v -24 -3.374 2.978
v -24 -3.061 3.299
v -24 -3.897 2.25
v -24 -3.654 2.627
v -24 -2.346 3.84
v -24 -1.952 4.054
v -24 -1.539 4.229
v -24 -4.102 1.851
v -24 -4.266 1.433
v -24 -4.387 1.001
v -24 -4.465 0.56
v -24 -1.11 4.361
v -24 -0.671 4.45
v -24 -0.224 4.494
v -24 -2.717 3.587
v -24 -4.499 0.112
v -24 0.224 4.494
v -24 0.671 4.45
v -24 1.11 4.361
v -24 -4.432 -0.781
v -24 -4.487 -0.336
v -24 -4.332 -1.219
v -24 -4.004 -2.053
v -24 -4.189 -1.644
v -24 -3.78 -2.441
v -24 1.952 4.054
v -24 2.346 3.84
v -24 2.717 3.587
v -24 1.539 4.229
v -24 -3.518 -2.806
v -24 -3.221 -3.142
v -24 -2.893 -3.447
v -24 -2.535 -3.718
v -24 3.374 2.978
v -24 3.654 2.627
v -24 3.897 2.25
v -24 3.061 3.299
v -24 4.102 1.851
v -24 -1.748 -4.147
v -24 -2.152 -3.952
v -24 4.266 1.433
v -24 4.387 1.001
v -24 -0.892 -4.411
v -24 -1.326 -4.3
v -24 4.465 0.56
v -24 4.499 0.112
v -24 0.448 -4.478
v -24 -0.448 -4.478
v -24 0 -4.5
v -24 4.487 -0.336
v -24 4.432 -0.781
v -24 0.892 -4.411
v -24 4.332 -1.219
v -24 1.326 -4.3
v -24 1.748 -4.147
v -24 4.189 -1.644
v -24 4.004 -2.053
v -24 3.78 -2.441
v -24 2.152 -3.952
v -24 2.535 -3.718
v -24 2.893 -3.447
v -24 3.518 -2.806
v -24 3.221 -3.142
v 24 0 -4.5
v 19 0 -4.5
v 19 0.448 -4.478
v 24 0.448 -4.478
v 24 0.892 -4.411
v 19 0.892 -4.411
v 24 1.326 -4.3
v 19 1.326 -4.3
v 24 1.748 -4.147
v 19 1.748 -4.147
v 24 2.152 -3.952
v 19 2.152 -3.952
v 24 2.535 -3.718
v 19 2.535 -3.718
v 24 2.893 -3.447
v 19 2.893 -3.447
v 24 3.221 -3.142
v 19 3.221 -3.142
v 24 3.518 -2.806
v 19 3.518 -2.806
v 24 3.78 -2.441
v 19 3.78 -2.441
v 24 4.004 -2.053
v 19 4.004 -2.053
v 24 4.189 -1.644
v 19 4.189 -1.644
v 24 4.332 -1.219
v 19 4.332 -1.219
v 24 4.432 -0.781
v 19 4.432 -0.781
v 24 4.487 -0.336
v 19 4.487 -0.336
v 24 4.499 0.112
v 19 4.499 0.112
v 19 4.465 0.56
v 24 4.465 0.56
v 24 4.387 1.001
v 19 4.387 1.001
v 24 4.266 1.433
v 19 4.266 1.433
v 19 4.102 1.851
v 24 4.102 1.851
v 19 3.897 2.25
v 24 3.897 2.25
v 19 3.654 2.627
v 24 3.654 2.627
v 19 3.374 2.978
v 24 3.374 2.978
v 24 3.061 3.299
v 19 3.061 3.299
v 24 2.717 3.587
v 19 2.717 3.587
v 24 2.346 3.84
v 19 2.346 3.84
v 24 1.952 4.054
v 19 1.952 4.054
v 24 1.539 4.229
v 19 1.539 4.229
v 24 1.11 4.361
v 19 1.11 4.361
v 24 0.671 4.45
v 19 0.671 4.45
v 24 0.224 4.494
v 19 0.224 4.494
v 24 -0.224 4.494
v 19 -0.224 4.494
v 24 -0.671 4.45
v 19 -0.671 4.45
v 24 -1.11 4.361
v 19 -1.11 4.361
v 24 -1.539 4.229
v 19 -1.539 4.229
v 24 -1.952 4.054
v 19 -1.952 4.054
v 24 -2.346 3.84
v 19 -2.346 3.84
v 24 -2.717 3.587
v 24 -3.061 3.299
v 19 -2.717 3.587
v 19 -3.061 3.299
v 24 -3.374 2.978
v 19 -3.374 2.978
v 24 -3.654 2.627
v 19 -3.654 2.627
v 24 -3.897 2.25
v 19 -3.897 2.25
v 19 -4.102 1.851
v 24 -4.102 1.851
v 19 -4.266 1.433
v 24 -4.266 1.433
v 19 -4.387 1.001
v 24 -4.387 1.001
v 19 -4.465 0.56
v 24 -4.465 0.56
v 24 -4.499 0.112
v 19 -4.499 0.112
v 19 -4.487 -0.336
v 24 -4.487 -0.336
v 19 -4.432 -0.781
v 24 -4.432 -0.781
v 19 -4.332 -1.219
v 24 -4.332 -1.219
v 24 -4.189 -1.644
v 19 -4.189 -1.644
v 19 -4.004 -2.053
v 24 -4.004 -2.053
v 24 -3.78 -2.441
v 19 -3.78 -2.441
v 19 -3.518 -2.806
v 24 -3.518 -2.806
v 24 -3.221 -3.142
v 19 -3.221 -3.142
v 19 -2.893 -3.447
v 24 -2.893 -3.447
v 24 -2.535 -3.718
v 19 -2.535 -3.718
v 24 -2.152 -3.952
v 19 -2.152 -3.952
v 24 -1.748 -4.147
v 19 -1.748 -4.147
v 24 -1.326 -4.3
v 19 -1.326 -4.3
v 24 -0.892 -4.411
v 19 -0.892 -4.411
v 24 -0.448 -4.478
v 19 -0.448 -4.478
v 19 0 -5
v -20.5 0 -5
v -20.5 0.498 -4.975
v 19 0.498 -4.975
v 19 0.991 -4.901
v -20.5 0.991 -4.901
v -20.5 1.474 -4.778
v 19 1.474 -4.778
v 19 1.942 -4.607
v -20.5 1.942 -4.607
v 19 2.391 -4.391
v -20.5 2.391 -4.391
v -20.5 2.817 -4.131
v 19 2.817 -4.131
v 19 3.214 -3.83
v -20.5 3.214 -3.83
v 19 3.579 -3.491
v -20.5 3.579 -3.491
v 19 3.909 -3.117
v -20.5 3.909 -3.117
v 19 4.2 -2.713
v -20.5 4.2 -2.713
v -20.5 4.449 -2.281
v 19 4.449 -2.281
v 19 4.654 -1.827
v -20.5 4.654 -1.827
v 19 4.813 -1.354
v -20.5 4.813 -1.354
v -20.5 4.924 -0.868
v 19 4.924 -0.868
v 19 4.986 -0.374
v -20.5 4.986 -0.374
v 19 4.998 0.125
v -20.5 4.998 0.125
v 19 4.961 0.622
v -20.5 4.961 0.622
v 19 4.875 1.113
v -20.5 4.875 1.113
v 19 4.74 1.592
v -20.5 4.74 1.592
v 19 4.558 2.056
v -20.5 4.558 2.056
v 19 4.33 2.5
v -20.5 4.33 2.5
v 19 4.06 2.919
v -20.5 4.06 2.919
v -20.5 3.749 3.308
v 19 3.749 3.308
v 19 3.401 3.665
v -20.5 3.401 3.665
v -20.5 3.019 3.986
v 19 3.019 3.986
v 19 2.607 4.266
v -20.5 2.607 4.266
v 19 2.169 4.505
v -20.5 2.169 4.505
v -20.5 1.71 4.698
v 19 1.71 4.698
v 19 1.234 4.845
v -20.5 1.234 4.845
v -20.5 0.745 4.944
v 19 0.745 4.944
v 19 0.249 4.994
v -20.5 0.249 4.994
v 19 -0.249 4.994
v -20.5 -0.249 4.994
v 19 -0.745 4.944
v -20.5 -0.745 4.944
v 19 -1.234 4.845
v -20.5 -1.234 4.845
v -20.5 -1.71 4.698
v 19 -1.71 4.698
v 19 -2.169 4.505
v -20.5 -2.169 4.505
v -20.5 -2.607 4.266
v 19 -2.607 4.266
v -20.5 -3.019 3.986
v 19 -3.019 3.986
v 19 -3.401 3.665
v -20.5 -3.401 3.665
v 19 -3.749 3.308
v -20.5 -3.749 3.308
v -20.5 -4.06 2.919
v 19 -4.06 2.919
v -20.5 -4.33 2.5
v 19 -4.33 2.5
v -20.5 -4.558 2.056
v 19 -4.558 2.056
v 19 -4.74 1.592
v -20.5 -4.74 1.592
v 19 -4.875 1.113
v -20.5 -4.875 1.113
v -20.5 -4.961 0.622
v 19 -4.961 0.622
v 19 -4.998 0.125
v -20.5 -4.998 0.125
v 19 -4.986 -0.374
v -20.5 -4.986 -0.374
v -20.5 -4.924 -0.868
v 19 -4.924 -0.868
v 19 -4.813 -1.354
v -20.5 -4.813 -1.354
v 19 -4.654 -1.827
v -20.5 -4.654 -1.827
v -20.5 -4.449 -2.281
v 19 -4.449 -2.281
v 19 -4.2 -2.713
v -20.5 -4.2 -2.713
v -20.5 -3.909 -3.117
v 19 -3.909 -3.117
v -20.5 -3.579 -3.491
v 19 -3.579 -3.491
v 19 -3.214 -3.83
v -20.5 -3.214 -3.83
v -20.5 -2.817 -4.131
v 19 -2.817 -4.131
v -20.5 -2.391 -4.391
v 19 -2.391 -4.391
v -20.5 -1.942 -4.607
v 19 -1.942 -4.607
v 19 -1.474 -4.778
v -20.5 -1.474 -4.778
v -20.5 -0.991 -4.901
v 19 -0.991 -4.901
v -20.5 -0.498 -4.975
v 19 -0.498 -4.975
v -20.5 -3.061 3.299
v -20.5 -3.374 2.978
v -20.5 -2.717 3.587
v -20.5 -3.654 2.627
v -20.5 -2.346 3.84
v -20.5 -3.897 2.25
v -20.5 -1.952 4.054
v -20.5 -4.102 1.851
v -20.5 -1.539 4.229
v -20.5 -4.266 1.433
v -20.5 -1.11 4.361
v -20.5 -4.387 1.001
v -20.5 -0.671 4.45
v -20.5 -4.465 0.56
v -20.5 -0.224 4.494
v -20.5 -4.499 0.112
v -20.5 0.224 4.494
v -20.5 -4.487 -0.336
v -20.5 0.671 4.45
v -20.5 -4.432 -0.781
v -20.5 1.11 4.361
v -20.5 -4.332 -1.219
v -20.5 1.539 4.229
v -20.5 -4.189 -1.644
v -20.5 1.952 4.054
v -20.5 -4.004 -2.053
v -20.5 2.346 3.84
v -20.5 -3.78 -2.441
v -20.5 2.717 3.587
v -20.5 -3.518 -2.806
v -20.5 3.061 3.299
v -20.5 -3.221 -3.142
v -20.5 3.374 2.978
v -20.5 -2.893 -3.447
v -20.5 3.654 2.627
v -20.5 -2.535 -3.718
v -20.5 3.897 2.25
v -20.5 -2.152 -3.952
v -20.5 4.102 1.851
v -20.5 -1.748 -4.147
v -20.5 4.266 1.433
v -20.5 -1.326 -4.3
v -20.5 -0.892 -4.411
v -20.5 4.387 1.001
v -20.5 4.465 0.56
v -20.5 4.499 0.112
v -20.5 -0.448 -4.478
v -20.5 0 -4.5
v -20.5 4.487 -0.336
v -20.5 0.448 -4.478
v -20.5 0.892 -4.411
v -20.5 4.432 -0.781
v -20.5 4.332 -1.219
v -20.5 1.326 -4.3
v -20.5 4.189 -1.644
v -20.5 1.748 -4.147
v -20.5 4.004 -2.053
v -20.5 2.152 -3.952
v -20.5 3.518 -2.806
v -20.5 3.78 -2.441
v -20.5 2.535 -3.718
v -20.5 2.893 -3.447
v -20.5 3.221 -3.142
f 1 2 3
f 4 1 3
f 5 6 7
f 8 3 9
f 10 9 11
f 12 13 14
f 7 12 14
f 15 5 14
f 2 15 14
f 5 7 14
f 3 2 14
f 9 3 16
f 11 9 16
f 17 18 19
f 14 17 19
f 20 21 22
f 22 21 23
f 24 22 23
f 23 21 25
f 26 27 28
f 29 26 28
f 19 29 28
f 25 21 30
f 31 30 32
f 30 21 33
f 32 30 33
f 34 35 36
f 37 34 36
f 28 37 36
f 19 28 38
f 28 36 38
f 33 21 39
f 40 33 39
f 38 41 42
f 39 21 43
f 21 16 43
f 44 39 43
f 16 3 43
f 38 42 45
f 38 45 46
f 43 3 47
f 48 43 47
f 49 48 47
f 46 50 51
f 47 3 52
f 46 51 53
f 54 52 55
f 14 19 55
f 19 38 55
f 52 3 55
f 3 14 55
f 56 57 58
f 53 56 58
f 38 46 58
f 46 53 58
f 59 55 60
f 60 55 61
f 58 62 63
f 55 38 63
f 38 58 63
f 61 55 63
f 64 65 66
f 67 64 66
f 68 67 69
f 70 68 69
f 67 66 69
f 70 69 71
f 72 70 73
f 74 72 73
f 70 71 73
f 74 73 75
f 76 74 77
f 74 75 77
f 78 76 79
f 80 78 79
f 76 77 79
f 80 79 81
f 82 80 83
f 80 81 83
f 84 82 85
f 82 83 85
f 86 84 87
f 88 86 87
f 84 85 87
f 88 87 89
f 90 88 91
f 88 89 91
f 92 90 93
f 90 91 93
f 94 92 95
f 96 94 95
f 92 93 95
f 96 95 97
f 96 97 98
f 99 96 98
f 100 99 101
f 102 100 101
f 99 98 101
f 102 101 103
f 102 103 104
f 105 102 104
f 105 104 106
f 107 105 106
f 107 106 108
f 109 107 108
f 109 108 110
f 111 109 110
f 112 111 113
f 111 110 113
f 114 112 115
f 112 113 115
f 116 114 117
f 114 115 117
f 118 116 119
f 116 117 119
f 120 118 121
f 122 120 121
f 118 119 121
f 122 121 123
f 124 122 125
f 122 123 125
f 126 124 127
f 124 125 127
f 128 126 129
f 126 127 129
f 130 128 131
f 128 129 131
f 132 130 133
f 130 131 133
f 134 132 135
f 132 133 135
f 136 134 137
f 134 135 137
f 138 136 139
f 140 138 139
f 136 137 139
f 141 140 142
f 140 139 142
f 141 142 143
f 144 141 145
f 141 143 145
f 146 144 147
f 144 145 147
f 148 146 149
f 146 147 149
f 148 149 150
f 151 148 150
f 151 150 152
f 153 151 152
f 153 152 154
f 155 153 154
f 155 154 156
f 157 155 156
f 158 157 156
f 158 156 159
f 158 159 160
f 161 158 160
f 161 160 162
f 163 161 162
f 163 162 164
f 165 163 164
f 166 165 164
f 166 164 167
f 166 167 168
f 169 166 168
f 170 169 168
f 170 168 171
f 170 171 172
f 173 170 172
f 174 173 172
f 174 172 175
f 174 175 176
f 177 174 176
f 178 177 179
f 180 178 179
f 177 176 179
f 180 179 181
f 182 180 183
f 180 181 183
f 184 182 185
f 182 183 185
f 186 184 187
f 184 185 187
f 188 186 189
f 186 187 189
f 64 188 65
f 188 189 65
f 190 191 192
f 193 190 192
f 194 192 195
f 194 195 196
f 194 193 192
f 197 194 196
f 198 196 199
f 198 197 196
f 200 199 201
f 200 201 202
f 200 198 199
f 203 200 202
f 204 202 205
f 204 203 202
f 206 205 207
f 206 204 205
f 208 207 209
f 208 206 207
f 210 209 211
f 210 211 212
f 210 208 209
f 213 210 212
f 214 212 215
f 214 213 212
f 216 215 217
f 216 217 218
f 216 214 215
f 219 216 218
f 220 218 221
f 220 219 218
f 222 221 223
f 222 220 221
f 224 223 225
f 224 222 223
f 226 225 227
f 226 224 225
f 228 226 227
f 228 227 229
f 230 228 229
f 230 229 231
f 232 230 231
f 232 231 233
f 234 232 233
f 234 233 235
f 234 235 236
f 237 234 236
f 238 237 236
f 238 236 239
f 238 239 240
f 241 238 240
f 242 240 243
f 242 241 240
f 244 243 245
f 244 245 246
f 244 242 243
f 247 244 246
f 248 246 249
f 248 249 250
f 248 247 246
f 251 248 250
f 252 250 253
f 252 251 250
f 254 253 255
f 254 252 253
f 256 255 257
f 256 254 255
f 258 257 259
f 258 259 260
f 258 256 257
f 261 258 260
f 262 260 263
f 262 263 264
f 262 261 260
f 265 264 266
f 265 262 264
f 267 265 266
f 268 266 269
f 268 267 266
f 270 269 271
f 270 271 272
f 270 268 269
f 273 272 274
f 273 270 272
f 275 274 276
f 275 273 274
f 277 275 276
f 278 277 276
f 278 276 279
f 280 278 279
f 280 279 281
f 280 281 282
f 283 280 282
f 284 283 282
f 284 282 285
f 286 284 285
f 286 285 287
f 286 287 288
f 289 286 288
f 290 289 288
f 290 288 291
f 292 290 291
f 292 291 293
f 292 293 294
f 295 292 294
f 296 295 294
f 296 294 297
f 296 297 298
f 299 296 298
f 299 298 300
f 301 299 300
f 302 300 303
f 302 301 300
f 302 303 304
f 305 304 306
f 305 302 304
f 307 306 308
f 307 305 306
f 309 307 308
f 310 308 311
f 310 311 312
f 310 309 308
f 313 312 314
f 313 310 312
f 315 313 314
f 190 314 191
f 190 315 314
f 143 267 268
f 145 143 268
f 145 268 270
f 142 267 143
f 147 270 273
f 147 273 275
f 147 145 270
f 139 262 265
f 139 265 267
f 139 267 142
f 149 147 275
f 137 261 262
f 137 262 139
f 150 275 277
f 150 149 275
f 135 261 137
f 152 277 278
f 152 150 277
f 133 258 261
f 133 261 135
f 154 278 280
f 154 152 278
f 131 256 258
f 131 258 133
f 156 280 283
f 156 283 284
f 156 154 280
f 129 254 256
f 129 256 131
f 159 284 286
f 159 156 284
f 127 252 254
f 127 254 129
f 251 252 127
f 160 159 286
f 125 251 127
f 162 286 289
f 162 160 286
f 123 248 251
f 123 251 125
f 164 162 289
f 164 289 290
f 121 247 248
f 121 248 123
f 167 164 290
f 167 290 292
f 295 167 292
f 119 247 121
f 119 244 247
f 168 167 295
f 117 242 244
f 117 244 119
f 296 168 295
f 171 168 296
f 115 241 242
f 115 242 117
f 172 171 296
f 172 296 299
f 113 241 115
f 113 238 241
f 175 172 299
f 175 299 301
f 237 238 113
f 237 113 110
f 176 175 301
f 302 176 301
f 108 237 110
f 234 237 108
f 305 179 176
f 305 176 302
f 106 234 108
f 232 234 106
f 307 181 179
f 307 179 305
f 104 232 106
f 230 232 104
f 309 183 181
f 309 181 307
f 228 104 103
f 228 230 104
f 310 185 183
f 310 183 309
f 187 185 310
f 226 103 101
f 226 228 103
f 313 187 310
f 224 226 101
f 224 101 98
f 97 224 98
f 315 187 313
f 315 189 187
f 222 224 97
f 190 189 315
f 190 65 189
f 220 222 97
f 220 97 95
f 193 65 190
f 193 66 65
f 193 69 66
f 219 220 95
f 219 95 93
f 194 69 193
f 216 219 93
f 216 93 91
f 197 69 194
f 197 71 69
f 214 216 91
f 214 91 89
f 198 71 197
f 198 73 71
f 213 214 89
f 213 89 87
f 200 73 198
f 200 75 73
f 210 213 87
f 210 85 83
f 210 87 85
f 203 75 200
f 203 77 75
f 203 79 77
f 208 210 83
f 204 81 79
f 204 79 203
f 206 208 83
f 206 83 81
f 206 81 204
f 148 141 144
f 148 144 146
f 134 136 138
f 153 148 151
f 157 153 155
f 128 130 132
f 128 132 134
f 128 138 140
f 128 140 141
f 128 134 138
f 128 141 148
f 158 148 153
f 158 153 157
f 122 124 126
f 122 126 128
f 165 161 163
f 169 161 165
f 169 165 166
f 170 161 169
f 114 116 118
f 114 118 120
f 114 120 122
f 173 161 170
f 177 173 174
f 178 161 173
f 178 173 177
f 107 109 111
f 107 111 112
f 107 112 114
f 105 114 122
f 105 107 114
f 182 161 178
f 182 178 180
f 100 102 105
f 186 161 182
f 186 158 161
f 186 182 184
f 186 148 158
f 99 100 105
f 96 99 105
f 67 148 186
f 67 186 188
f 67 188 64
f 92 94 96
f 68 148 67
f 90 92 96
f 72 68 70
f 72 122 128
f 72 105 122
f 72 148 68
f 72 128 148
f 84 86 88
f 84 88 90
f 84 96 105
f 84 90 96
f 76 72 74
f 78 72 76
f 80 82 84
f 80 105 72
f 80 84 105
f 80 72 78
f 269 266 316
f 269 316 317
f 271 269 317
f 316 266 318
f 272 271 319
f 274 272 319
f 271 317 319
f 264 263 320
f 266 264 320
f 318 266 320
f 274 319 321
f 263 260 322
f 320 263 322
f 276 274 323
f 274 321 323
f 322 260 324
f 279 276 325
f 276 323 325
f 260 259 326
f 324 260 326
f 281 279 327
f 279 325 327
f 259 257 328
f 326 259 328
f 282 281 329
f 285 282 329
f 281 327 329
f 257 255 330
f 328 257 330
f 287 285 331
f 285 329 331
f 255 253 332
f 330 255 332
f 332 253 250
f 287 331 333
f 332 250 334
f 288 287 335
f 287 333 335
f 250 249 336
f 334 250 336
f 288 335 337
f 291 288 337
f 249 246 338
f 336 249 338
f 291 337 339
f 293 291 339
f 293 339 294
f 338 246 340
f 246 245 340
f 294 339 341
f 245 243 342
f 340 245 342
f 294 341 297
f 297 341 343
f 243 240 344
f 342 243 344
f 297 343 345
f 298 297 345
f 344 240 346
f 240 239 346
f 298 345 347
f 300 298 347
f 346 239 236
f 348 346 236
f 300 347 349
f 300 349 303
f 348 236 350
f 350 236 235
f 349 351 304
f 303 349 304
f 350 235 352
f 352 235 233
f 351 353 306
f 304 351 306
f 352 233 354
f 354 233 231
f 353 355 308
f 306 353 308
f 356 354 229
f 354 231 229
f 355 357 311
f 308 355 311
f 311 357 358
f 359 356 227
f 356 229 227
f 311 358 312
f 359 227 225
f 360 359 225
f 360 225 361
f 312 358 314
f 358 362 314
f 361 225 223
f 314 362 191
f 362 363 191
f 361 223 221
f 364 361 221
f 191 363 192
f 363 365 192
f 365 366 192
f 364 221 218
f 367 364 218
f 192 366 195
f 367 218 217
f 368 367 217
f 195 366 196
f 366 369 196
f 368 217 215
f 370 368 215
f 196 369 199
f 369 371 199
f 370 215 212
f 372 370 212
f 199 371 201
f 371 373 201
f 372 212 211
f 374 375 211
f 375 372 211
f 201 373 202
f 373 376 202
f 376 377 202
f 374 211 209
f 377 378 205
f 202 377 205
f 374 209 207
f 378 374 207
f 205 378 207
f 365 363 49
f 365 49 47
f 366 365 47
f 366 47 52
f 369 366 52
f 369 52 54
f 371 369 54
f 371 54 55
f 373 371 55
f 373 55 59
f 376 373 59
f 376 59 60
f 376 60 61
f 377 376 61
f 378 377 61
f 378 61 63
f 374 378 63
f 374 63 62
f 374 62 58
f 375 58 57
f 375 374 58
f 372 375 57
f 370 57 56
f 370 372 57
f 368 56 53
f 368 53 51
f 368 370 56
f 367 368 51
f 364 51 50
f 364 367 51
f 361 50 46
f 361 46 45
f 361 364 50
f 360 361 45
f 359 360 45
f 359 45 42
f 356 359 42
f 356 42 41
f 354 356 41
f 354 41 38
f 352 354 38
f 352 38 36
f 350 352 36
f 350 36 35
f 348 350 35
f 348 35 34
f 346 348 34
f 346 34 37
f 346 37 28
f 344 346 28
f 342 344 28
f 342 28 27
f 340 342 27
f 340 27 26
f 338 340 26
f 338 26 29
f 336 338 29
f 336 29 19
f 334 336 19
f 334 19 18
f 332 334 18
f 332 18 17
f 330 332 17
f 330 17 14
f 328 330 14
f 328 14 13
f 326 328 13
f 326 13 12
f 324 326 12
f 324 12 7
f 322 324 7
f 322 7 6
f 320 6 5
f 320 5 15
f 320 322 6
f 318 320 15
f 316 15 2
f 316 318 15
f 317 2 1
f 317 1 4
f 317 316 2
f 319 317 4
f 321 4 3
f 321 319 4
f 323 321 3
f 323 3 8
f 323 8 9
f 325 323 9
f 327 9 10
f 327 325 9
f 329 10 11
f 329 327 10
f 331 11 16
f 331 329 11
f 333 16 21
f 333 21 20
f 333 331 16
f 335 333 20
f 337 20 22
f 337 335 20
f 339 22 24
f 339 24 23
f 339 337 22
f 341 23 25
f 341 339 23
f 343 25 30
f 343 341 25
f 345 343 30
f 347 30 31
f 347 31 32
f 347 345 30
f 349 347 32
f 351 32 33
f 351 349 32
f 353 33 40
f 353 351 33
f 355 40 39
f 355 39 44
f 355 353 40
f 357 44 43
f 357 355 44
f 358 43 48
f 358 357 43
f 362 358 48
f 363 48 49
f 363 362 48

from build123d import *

# Parameters (mm, degrees)
SKETCH1_R                = 5
BOSS_EXTRUDE1_DEPTH      = 19
BOSS_EXTRUDE1_DEPTH_BACK = 20.5
SKETCH2_R                = 4.5
BOSS_EXTRUDE2_DEPTH      = 5


with BuildPart() as part:
    # Sketch1 → Boss-Extrude1 (new body, two sides)
    with BuildSketch(Plane(origin=(0, 0, 0), x_dir=(0, 0, -1), z_dir=(1, 0, 0))) as boss_extrude1_sk:
        Circle(SKETCH1_R)
    extrude(amount=BOSS_EXTRUDE1_DEPTH)
    extrude(boss_extrude1_sk.sketch, amount=-BOSS_EXTRUDE1_DEPTH_BACK)

    # Sketch2 → Boss-Extrude2 (add)
    with BuildSketch(Plane(origin=(19, 0, 0), x_dir=(0, 0, -1), z_dir=(1, 0, 0))):
        Circle(SKETCH2_R)
    boss_extrude2 = extrude(amount=BOSS_EXTRUDE2_DEPTH)

    # Mirror1: Boss-Extrude2 across plane
    add(boss_extrude2.mirror(Plane(origin=(0, 0, 0), x_dir=(0, 0, 1), z_dir=(1, 0, 0))))


solid = part.part
